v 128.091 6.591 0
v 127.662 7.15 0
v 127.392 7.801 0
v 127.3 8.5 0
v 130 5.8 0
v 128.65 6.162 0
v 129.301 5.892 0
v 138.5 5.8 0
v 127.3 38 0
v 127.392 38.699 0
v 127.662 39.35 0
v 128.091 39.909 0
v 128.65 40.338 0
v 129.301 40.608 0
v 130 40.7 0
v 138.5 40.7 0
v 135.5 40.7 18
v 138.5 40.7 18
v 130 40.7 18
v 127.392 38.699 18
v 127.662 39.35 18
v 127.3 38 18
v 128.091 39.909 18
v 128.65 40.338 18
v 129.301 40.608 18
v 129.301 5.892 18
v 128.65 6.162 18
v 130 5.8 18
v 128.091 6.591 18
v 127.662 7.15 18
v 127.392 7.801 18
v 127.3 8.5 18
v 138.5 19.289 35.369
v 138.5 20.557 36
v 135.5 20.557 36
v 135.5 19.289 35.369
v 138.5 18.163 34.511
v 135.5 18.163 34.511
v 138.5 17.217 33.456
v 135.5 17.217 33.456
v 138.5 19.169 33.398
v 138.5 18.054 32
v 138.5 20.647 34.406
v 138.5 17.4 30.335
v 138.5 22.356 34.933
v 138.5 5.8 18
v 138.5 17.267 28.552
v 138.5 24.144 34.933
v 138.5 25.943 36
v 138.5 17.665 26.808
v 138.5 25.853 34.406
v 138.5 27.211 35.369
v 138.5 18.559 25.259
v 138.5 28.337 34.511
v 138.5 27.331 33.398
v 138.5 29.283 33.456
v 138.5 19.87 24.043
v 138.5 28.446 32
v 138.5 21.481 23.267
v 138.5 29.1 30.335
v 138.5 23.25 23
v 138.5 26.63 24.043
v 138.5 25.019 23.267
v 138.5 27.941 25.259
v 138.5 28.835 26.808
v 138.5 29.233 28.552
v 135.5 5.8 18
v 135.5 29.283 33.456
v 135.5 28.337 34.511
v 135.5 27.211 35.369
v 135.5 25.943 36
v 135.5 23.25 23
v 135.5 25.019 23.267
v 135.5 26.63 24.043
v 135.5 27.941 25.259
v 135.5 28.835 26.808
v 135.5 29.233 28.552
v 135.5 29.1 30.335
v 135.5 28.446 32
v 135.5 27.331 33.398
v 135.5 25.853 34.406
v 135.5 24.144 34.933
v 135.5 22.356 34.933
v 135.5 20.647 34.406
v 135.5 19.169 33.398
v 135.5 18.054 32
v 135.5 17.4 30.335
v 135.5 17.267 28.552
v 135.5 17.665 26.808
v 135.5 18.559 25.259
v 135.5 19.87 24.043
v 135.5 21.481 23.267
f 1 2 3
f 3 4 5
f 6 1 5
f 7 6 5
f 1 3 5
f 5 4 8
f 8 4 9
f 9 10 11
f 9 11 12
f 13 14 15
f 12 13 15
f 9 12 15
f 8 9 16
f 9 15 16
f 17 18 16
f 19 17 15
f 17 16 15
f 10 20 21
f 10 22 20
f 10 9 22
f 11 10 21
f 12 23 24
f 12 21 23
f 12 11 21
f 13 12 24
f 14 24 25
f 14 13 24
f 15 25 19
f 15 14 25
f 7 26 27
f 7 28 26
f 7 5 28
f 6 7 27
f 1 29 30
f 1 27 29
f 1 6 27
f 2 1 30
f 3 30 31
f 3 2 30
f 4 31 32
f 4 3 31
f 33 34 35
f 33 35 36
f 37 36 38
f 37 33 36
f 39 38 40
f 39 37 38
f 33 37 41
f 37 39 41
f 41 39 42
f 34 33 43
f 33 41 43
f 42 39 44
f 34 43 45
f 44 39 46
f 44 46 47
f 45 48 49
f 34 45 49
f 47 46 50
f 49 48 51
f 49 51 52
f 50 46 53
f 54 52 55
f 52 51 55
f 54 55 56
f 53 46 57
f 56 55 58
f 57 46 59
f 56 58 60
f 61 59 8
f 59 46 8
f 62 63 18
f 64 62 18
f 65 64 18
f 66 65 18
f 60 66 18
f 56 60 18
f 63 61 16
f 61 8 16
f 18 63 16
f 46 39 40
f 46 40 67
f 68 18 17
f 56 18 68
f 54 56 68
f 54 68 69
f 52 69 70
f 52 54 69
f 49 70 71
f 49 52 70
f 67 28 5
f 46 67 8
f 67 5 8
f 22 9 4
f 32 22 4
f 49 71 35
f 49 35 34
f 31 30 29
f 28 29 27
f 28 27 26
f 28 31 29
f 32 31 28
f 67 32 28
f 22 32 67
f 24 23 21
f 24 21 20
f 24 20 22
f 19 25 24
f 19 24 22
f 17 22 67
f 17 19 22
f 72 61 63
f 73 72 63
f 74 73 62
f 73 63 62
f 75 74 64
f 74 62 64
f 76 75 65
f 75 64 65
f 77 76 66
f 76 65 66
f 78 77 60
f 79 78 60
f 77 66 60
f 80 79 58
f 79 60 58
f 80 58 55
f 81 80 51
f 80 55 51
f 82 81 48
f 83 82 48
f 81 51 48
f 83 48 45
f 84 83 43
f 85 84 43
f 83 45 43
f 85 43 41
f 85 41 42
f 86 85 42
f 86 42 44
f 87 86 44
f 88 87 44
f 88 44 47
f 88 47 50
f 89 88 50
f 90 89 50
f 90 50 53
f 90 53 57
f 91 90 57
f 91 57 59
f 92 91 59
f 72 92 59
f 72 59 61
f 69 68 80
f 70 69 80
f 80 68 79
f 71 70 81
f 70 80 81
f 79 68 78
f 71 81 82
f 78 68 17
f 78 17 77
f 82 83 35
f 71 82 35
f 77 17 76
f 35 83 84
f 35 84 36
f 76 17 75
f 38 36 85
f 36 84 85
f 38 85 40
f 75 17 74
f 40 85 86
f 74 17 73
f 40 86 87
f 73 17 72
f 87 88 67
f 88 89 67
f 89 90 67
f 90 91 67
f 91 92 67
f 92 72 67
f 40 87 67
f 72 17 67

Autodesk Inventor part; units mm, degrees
ref_plane "YZ Plane" through (0, 0, 0) normal (1, 0, 0) x (0, 1, 0)
ref_plane "XZ Plane" through (0, 0, 0) normal (0, 1, 0) x (-1, 0, 0)
ref_plane "Work Plane1" through (0, 0, 0) normal (0, 0, 1) x (1, 0, 0)
sketch "Sketch1" plane through (0, 0, 0) normal (0, 0, 1) x (1, 0, 0)
  circle A0 centre (119.5, 7) radius 3.3 projected
  circle A1 centre (119.5, 38) radius 3.3 projected
  circle A2 centre (88.5, 38) radius 3.3 projected
  circle A3 centre (88.5, 7) radius 3.3 projected
  circle A4 centre (104, 22.5) radius 11 projected
  circle A5 centre (-76, 8.5) radius 1.7 projected
  circle A6 centre (-76, 38) radius 1.7 projected
  circle A7 centre (-45, -33.5) radius 4.3 projected
  circle A8 centre (-45, -3) radius 4.3 projected
  circle A9 centre (-60.5, 12.5) radius 1.7 projected
  circle A10 centre (-60.5, 43.5) radius 1.7 projected
  circle A11 centre (-29.5, 43.5) radius 1.7 projected
  circle A12 centre (-29.5, 12.5) radius 1.7 projected
  circle A13 centre (-45, 28) radius 11.5 projected
  circle A14 centre (-122.5, -32.5) radius 3.3 projected
  circle A15 centre (-83.5, -32.5) radius 3.3 projected
  circle A16 centre (83.5, -32.5) radius 3.3 projected
  circle A17 centre (122.5, -32.5) radius 3.3 projected
  circle A18 centre (-103, 22.5) radius 2.75 projected
  circle A19 centre (78, 8.5) radius 1.7 projected
  circle A20 centre (78, 38) radius 1.7 projected
  circle A21 centre (-130, 8.5) radius 1.7 projected
  circle A22 centre (-130, 38) radius 1.7 projected
  circle A23 centre (130, 38) radius 1.7 projected
  circle A24 centre (130, 8.5) radius 1.7 projected
  arc A25 (-135, -38.5) -> (-130, -43.5) centre (-130, -38.5) ccw projected
  line L0 (130, -43.5) -> (-130, -43.5) projected
  arc A26 (130, -43.5) -> (135, -38.5) centre (130, -38.5) ccw projected
  line L1 (135, 38.5) -> (135, -38.5) projected
  arc A27 (135, 38.5) -> (130, 43.5) centre (130, 38.5) ccw projected
  line L2 (-24, 43.5) -> (130, 43.5) projected
  line L3 (-24, 43.5) -> (-24, 45.5) projected
  line L4 (-24, 45.5) -> (-27.5, 49) projected
  line L5 (-27.5, 49) -> (-62.5, 49) projected
  line L6 (-62.5, 49) -> (-66, 45.5) projected
  line L7 (-66, 45.5) -> (-66, 43.5) projected
  line L8 (-130, 43.5) -> (-66, 43.5) projected
  arc A28 (-130, 43.5) -> (-135, 38.5) centre (-130, 38.5) ccw projected
  line L9 (-135, -38.5) -> (-135, 38.5) projected
  line L10 (-115.5, -26.5) -> (-115.5, -38.5) projected
  line L11 (-90.5, -26.5) -> (-115.5, -26.5) projected
  line L12 (-90.5, -38.5) -> (-90.5, -26.5) projected
  line L13 (-115.5, -38.5) -> (-90.5, -38.5) projected
  line L14 (117.5, -38.5) -> (117.5, -26.5) projected
  line L15 (90.5, -38.5) -> (117.5, -38.5) projected
  line L16 (90.5, -26.5) -> (90.5, -38.5) projected
  line L17 (117.5, -26.5) -> (90.5, -26.5) projected
  line L18 (130, 38) -> (130, 8.5) construction
  line L19 (127.3, 38) -> (127.3, 8.5)
  arc A29 (130, 40.7) -> (127.3, 38) centre (130, 38) ccw
  arc A30 (127.3, 8.5) -> (130, 5.8) centre (130, 8.5) ccw
  line L20 (135, 38.5) -> (135, 40.7)
  line L21 (130, 5.8) -> (138.5, 5.8)
  line L22 (135.5, 40.7) -> (135.5, 5.8)
  line L23 (138.5, 40.7) -> (138.5, 5.8)
  line L24 (138.5, 40.7) -> (130, 40.7)
  point P0 (0, 0)
  point P1 (130, 23.25)
  dimension "d0" = 5.4
  dimension "d1" = 0.5
  dimension "d2" = 3
ref_plane "Work Plane2" through (-135, -43.5, 18) normal (0, 0, -1) x (0, 1, 0)
extrude "Extrusion1" add sketch "Sketch1" along normal up to surface (18 mm away) contours A23 | A24 | L21 A30 L19 A29 L24 A27 L1 | L1 L20 L24 L22 L21 | A27 L24 L20 | L22 L24 L23 L21
sketch "Sketch2" plane through (130, 40.7, 18) normal (0, 0, 1) x (1, 0, 0)
  arc A0 (0, 0) -> (-2.7, -2.7) centre (0, -2.7) ccw projected
  line L0 (8.5, 0) -> (0, 0) projected
  line L1 (8.5, -34.9) -> (8.5, 0) projected
  line L2 (0, -34.9) -> (8.5, -34.9) projected
  arc A1 (-2.7, -32.2) -> (0, -34.9) centre (0, -32.2) ccw projected
  line L3 (-2.7, -2.7) -> (-2.7, -32.2) projected
  line L4 (5.5, 0) -> (5.5, -34.9) projected
  line L5 (5, -2.2) -> (5, 0) projected
  line L6 (5, -2.2) -> (5, -79.2) projected
  point P0 (-130, -40.7)
extrude "Extrusion2" add sketch "Sketch2" along normal blind 18 contours L0 L1 L2 L4
sketch "Sketch3" plane through (138.5, 5.8, 0) normal (1, 0, 0) x (0, 0, -1)
  line L0 (-36, 0) -> (-36, 34.9) projected
  line L1 (-22, 32.7) -> (-22, -44.3) projected
  line L2 (-22, 32.7) -> (-22, 37.7) projected
  circle A0 centre (-29, 17.45) radius 7.5
  line L3 (-36, 17.45) -> (-22, 17.45) construction
  line L4 (-18, 37.7) -> (-18, 32.7) projected
  line L5 (-18, 32.7) -> (-18, -44.3) projected
  line L6 (-18, 34.9) -> (-36, 34.9) projected
  line L7 (0, 0) -> (-36, 0) projected
  line L8 (-18, 34.9) -> (-33.4562, 23.4826)
  line L9 (-33.4562, 11.4174) -> (-18, 0)
  circle A1 centre (-29, 17.45) radius 6
  point P0 (0, -5.8)
  point P1 (-36, 20.1426)
  point P2 (-36, 14.7574)
  point P3 (-22, 20.1426)
  point P4 (-22, 14.7574)
  dimension "d7" = 15
  dimension "d8" = 12
extrude "Extrusion3" cut sketch "Sketch3" against normal through all contours L0 A0 L9 L1 L7 | A0 L0 | L1 L9 L7 | L0 L6 L2 L1 L8 A0 | L6 L8 L1 L2 | A1
properties part number "tumbler_holdeerr"
